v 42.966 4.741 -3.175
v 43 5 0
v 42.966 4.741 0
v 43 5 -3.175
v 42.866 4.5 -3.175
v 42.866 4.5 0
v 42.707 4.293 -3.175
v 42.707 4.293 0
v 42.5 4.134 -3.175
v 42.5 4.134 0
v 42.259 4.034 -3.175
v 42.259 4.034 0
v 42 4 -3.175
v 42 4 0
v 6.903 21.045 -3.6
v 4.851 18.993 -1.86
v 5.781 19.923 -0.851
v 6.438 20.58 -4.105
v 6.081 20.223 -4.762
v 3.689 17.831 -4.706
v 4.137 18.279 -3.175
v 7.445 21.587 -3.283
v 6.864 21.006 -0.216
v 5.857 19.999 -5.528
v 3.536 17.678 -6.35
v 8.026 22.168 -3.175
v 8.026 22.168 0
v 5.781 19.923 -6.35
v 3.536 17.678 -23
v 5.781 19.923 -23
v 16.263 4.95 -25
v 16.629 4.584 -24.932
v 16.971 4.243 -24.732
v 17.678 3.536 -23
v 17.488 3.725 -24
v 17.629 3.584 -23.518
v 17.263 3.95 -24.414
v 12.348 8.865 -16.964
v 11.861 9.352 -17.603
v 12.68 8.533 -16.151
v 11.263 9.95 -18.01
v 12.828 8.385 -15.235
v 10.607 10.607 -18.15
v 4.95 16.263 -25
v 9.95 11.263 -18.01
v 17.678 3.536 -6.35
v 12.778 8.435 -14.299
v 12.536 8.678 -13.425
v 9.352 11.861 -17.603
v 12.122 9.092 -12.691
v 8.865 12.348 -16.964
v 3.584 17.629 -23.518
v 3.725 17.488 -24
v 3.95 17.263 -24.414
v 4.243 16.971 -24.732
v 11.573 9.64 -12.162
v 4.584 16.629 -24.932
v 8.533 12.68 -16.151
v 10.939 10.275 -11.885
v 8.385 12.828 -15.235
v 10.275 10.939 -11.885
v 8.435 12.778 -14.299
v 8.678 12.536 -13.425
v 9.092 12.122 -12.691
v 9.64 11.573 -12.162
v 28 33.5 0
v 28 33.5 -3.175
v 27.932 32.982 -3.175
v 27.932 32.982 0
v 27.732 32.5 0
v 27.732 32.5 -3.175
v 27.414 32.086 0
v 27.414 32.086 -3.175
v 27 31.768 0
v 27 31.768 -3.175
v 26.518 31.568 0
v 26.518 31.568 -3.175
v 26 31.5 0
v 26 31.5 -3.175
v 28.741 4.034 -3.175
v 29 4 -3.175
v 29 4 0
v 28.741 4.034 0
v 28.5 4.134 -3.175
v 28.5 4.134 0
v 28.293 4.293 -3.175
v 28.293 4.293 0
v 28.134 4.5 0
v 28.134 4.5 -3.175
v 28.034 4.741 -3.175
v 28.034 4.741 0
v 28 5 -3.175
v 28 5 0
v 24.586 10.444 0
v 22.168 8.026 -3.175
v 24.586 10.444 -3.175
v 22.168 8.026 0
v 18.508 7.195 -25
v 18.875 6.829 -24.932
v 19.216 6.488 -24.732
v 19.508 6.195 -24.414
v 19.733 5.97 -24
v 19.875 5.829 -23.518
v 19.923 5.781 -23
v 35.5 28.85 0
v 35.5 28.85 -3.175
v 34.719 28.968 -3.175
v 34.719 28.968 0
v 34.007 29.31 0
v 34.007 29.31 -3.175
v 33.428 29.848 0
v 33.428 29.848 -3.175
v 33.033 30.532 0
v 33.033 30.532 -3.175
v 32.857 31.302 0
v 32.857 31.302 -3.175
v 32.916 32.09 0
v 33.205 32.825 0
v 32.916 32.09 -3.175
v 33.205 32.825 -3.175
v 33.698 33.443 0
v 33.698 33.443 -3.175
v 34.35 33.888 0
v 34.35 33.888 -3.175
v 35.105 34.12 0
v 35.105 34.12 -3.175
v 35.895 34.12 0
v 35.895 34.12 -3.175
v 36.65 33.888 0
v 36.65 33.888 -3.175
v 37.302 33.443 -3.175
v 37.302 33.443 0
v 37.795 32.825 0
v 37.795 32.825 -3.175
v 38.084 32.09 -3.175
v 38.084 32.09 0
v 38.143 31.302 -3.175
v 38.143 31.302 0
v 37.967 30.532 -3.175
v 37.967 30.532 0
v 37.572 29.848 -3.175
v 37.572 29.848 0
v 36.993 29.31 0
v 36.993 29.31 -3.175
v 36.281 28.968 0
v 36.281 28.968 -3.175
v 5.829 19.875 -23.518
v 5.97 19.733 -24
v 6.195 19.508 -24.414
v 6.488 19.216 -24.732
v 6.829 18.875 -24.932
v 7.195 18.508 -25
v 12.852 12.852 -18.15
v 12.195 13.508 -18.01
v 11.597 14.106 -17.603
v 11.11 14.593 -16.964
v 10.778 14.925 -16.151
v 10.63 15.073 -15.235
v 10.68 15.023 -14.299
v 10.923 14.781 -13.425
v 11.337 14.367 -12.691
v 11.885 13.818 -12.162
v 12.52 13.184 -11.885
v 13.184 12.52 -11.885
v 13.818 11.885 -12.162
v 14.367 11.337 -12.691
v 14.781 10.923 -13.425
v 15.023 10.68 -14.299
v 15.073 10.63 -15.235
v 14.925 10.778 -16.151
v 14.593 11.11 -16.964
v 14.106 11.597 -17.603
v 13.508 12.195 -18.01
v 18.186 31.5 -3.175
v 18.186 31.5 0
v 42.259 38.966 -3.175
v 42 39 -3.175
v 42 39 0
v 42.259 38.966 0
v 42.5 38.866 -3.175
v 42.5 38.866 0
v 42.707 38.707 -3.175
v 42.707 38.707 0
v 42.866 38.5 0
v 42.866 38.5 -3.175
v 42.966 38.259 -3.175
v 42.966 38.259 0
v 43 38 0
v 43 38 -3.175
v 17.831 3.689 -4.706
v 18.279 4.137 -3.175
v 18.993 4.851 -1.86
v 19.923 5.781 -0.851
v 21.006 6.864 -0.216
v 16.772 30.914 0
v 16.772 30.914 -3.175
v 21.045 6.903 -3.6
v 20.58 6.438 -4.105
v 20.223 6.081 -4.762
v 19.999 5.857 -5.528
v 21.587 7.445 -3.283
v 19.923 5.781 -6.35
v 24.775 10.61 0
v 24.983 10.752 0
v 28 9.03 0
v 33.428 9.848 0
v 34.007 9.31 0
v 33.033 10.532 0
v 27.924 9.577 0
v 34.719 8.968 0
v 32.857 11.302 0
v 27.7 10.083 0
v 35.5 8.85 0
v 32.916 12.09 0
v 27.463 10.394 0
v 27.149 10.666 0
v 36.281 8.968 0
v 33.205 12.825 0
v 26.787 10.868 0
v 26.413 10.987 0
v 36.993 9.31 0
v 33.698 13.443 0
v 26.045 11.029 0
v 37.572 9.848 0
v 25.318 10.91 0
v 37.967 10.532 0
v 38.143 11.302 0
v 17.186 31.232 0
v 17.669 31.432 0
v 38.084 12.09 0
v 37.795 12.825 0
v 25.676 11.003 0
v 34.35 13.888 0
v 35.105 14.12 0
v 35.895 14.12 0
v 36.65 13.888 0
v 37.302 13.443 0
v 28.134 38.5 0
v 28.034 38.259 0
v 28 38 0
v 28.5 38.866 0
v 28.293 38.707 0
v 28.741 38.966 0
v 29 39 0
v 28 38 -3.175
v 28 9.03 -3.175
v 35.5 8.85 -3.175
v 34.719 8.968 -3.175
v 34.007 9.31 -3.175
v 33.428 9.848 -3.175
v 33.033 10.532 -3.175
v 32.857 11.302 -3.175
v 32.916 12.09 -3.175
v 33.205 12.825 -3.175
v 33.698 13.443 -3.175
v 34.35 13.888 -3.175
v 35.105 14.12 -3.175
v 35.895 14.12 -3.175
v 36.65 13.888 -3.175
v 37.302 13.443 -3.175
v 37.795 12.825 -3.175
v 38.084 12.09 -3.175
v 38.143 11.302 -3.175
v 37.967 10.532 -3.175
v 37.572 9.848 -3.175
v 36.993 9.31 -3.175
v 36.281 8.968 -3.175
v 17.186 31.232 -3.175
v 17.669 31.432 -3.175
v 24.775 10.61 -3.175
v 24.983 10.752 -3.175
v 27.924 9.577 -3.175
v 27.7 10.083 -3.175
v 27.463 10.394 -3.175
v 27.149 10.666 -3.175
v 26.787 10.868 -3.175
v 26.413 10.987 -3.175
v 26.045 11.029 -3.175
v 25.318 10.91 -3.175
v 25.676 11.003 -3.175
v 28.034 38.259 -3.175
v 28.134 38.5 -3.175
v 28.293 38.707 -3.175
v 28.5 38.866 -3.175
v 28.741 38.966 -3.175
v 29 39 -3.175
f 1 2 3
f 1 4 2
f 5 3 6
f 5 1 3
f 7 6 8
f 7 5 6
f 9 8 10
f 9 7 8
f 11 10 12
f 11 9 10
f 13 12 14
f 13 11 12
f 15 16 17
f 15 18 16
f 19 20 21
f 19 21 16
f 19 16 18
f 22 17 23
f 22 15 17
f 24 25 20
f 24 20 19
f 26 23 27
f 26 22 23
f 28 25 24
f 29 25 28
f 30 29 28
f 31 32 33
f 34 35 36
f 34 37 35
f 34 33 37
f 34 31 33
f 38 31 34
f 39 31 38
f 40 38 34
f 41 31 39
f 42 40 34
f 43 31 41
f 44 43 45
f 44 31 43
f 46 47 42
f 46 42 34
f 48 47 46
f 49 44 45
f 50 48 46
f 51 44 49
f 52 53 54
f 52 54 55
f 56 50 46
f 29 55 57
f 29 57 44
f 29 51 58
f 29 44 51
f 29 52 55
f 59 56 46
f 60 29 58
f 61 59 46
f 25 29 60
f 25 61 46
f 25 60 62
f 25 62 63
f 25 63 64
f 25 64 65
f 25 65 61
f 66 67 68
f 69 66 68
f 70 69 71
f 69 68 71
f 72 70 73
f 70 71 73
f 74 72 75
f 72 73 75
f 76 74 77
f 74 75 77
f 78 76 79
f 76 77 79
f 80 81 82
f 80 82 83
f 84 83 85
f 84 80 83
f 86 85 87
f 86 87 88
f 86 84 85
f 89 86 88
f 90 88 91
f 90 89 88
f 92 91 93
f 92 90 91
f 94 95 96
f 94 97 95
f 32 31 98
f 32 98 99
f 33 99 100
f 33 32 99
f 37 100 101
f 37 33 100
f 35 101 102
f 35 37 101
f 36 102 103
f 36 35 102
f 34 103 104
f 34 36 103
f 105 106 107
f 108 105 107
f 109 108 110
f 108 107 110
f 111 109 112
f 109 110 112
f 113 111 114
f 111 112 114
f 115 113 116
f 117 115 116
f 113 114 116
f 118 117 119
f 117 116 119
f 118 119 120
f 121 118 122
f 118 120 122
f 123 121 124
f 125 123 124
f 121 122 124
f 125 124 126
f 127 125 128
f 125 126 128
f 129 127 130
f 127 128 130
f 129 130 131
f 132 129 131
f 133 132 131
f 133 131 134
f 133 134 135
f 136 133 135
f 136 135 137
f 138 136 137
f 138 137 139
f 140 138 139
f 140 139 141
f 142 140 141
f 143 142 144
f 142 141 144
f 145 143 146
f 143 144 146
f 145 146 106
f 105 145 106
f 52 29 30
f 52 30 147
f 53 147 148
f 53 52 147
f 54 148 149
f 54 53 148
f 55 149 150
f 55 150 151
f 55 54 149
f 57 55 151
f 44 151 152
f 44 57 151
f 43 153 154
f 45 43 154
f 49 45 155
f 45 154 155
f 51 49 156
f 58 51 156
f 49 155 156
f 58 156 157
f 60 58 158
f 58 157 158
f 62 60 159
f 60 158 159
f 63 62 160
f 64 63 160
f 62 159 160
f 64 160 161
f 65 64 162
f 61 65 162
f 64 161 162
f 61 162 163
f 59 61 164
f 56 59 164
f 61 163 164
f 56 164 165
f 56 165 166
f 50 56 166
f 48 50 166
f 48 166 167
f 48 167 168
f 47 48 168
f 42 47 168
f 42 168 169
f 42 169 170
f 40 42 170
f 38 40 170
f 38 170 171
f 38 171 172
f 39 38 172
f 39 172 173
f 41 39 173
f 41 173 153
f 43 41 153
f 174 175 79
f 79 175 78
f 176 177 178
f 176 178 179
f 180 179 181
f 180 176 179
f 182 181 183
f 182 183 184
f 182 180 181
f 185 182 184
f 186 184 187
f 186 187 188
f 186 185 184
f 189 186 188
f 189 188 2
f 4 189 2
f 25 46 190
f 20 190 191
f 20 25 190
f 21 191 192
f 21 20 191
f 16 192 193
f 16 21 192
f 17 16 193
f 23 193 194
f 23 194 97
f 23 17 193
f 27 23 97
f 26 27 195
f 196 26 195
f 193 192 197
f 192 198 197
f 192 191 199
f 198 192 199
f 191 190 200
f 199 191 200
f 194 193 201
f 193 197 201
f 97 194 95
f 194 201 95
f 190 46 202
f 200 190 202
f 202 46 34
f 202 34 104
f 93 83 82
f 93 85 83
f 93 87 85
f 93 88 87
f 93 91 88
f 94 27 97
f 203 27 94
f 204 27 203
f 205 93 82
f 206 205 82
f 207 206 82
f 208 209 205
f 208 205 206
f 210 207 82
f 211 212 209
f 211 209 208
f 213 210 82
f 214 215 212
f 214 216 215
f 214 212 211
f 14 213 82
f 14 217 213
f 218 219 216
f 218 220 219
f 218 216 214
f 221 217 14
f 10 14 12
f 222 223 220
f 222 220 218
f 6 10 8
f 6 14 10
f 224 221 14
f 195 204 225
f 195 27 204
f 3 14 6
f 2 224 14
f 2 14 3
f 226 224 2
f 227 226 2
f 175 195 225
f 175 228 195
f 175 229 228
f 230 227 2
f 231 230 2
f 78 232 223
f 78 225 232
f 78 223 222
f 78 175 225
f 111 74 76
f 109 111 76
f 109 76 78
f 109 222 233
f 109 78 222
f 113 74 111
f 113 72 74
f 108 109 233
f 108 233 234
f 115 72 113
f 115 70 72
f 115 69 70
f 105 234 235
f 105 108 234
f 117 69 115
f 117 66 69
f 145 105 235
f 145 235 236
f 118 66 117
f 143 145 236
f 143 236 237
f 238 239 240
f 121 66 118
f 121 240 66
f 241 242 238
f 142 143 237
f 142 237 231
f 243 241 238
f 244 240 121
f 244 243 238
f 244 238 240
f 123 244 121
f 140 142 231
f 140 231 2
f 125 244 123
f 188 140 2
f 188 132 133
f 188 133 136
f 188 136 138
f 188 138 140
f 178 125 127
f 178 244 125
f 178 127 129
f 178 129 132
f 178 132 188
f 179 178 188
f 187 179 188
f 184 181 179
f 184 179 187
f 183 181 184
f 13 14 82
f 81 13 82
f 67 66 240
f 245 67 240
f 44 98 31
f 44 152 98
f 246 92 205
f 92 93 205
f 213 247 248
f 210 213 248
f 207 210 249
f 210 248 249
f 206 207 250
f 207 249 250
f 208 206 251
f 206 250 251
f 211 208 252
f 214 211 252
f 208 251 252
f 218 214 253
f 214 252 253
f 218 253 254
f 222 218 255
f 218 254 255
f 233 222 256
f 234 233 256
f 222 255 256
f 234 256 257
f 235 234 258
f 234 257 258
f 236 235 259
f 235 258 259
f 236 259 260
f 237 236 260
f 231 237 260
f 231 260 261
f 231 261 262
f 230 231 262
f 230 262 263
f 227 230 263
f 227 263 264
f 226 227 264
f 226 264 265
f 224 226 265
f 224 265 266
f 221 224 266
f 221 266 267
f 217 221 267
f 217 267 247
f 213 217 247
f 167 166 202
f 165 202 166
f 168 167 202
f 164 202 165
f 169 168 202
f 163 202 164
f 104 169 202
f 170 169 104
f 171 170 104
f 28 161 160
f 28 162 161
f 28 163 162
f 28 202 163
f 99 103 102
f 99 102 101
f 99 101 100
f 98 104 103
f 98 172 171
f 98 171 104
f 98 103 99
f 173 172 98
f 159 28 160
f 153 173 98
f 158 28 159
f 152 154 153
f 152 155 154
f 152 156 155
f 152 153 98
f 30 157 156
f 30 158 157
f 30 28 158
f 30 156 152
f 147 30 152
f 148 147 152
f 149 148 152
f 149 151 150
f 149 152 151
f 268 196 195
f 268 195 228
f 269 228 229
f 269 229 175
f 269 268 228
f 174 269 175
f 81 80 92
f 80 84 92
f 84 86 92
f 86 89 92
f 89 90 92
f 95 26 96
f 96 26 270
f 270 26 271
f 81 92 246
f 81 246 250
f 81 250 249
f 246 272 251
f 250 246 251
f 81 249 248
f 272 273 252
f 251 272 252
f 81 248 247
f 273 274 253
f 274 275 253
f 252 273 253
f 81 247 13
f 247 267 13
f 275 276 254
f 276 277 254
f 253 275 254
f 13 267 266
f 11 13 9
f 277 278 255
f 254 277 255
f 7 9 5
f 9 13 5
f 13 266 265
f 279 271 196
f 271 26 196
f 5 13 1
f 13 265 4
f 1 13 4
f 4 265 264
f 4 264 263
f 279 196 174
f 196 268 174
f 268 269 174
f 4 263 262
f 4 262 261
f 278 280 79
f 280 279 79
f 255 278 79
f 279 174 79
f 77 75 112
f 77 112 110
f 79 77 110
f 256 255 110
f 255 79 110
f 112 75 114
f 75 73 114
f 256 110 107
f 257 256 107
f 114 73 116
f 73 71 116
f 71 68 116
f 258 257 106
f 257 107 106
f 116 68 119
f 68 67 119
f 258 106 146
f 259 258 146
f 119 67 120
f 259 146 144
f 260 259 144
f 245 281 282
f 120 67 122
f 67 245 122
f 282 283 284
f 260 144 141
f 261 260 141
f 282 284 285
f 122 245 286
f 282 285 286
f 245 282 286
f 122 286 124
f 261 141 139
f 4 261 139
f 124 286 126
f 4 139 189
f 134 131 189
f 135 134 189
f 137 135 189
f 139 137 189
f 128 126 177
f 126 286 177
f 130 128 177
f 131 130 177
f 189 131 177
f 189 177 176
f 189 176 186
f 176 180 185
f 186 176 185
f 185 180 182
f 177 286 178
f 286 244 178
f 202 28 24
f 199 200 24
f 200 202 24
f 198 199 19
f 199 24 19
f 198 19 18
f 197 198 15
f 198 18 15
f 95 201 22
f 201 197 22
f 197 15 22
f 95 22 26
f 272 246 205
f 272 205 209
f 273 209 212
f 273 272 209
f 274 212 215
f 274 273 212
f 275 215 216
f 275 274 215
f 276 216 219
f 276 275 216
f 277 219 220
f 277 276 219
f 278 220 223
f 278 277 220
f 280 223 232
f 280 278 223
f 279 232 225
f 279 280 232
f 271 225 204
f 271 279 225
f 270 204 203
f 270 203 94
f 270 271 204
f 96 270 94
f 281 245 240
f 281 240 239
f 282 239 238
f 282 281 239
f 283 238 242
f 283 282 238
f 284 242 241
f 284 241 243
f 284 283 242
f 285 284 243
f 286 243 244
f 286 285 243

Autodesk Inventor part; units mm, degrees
ref_plane "YZ Plane" through (0, 0, 0) normal (1, 0, 0) x (0, 1, 0)
ref_plane "XZ Plane" through (0, 0, 0) normal (0, 1, 0) x (-1, 0, 0)
ref_plane "XY Plane" through (0, 0, 0) normal (0, 0, 1) x (1, 0, 0)
sketch "Sketch1" plane through (0, 0, 0) normal (0, 0, 1) x (1, 0, 0)
  line L0 (0, -21.2132) -> (-21.2132, 0) construction
  line L1 (-21.2132, 0) -> (0, 21.2132) construction
  line L2 (0, 21.2132) -> (21.2132, 0) construction
  line L3 (21.2132, 0) -> (0, -21.2132) construction
  line L4 (0, -21.2132) -> (0, 21.2132) construction
  line L5 (-21.2132, 0) -> (21.2132, 0) construction
  line L6 (43, 4) -> (28, 4)
  line L7 (28, 4) -> (28, 39)
  line L8 (28, 39) -> (43, 39)
  line L9 (43, 39) -> (43, 4)
  line L10 (43, 4) -> (28, 39) construction
  line L11 (28, 4) -> (43, 39) construction
  line L12 (35.5, 11.5) -> (35.5, 31.5) construction
  line L13 (17.6777, 3.5355) -> (3.5355, 17.6777)
  line L14 (3.5355, 17.6777) -> (17.3579, 31.5)
  line L15 (17.3579, 31.5) -> (28, 31.5)
  line L16 (17.6777, 3.5355) -> (25.6421, 11.5)
  line L17 (25.6421, 11.5) -> (28, 11.5)
  line L18 (28, 11.5) -> (28, 31.5)
  point P0 (0, 0)
  point P1 (35.5, 21.5)
  point P2 (0, 0)
  point P3 (0, 0)
  point P4 (35.5, 21.5)
  point P5 (43, 21.5)
  point P6 (10.6066, 10.6066)
  point P7 (28, 21.5)
  dimension "d0" = 30
  dimension "d1" = 28
  dimension "d2" = 21.5
  dimension "d3" = 35
  dimension "d5" = 20
  dimension "d6" = 7.5
  dimension "d7" = 7.5
  dimension "d8" = 7.5
  dimension "d11" = 20
  dimension "d12" = 20
extrude "Plate2" add sketch "Sketch1" against normal blind 3.175
sketch "Sketch2" plane through (5.7806, 19.9227, 0) normal (-0.7071068, -0.7071068, 0) x (0.7071068, -0.7071068, 0)
  line L0 (20, 0) -> (0, 0)
  line L1 (0, 0) -> (0, -25)
  line L2 (0, -25) -> (20, -25)
  line L3 (20, -25) -> (20, 0)
edge flange "Flange1" height 25 angle 90 thickness 3.175 bend radius 3.175 thickness toward (-0.7071068, -0.7071068, 0) relief tear relief width 3.175 relief depth 1.5875 edges at (10.6066, 10.6066, -3.175) wall of the first edge with corners at (19.9227, 5.7806, 0) (5.7806, 19.9227, 0) (5.7806, 19.9227, -25) (19.9227, 5.7806, -25)
bend "Bend1"
corner "Corner1"
fillet "Fillet1" radius 2 4 edges at (25.6421, 11.5, -1.5875) (28, 11.5, -1.5875) (28, 31.5, -1.5875) (17.3579, 31.5, -1.5875)
sketch "Sketch3" plane through (3.5355, 17.6777, -6.35) normal (-0.7071068, -0.7071068, 0) x (-0.7071068, 0.7071068, 0)
  line L0 (0, -1.35) -> (-20, -1.35) construction
  line L1 (-20, -1.35) -> (-20, 18.65) construction
  line L2 (-20, 18.65) -> (0, 18.65) construction
  line L3 (0, 18.65) -> (0, -1.35) construction
  line L4 (0, -1.35) -> (-20, 18.65) construction
  line L5 (-20, -1.35) -> (0, 18.65) construction
  point P0 (-10, -6.35)
  point P1 (-10, 8.65)
hole "Hole2" at (10.6066, 10.6066, -15) direction (0.7071068, 0.7071068, 0) diameter 6.3 end through all
fillet "Fillet2" radius 2 2 edges at (4.6581, 18.8002, -25) (18.8002, 4.6581, -25)
fillet "Fillet3" radius 1 4 edges at (28, 4, -1.5875) (28, 39, -1.5875) (43, 4, -1.5875) (43, 39, -1.5875)
hole "Hole1" at (35.5, 31.5, 0) at (35.5, 11.5, 0) direction (0, 0, -1) diameter 5.3 end through all
equation "\"d6\" = d7"
equation "\"d8\" = d6"
equation "\"d12\" = d11"
equation "\"d32\" = Thickness"
equation "\"d13\" = Thickness"
equation "\"d14\" = BendReliefWidth"
equation "\"d15\" = BendReliefDepth"
equation "\"d16\" = MinimumRemnant"
equation "\"d17\" = TransitionRadius"
equation "\"d20\" = BendRadius"
equation "\"d21\" = CornerReliefSize"
equation "\"d22\" = GapSize"
equation "\"d23\" = JacobiRadiusSize"
equation "\"BendReliefWidth\" = Thickness"
equation "\"BendReliefDepth\" = 0.5 * Thickness"
equation "\"CornerReliefSize\" = 4 * Thickness"
equation "\"MinimumRemnant\" = 2 * Thickness"
equation "\"TransitionRadius\" = BendRadius"
equation "\"JacobiRadiusSize\" = BendRadius"
equation "\"GapSize\" = Thickness"
equation "\"Thickness\" = 3.175"
equation "\"BendRadius\" = 3.175"
properties part number "External Frame Corner Bracket" material "Aluminum 6061"
